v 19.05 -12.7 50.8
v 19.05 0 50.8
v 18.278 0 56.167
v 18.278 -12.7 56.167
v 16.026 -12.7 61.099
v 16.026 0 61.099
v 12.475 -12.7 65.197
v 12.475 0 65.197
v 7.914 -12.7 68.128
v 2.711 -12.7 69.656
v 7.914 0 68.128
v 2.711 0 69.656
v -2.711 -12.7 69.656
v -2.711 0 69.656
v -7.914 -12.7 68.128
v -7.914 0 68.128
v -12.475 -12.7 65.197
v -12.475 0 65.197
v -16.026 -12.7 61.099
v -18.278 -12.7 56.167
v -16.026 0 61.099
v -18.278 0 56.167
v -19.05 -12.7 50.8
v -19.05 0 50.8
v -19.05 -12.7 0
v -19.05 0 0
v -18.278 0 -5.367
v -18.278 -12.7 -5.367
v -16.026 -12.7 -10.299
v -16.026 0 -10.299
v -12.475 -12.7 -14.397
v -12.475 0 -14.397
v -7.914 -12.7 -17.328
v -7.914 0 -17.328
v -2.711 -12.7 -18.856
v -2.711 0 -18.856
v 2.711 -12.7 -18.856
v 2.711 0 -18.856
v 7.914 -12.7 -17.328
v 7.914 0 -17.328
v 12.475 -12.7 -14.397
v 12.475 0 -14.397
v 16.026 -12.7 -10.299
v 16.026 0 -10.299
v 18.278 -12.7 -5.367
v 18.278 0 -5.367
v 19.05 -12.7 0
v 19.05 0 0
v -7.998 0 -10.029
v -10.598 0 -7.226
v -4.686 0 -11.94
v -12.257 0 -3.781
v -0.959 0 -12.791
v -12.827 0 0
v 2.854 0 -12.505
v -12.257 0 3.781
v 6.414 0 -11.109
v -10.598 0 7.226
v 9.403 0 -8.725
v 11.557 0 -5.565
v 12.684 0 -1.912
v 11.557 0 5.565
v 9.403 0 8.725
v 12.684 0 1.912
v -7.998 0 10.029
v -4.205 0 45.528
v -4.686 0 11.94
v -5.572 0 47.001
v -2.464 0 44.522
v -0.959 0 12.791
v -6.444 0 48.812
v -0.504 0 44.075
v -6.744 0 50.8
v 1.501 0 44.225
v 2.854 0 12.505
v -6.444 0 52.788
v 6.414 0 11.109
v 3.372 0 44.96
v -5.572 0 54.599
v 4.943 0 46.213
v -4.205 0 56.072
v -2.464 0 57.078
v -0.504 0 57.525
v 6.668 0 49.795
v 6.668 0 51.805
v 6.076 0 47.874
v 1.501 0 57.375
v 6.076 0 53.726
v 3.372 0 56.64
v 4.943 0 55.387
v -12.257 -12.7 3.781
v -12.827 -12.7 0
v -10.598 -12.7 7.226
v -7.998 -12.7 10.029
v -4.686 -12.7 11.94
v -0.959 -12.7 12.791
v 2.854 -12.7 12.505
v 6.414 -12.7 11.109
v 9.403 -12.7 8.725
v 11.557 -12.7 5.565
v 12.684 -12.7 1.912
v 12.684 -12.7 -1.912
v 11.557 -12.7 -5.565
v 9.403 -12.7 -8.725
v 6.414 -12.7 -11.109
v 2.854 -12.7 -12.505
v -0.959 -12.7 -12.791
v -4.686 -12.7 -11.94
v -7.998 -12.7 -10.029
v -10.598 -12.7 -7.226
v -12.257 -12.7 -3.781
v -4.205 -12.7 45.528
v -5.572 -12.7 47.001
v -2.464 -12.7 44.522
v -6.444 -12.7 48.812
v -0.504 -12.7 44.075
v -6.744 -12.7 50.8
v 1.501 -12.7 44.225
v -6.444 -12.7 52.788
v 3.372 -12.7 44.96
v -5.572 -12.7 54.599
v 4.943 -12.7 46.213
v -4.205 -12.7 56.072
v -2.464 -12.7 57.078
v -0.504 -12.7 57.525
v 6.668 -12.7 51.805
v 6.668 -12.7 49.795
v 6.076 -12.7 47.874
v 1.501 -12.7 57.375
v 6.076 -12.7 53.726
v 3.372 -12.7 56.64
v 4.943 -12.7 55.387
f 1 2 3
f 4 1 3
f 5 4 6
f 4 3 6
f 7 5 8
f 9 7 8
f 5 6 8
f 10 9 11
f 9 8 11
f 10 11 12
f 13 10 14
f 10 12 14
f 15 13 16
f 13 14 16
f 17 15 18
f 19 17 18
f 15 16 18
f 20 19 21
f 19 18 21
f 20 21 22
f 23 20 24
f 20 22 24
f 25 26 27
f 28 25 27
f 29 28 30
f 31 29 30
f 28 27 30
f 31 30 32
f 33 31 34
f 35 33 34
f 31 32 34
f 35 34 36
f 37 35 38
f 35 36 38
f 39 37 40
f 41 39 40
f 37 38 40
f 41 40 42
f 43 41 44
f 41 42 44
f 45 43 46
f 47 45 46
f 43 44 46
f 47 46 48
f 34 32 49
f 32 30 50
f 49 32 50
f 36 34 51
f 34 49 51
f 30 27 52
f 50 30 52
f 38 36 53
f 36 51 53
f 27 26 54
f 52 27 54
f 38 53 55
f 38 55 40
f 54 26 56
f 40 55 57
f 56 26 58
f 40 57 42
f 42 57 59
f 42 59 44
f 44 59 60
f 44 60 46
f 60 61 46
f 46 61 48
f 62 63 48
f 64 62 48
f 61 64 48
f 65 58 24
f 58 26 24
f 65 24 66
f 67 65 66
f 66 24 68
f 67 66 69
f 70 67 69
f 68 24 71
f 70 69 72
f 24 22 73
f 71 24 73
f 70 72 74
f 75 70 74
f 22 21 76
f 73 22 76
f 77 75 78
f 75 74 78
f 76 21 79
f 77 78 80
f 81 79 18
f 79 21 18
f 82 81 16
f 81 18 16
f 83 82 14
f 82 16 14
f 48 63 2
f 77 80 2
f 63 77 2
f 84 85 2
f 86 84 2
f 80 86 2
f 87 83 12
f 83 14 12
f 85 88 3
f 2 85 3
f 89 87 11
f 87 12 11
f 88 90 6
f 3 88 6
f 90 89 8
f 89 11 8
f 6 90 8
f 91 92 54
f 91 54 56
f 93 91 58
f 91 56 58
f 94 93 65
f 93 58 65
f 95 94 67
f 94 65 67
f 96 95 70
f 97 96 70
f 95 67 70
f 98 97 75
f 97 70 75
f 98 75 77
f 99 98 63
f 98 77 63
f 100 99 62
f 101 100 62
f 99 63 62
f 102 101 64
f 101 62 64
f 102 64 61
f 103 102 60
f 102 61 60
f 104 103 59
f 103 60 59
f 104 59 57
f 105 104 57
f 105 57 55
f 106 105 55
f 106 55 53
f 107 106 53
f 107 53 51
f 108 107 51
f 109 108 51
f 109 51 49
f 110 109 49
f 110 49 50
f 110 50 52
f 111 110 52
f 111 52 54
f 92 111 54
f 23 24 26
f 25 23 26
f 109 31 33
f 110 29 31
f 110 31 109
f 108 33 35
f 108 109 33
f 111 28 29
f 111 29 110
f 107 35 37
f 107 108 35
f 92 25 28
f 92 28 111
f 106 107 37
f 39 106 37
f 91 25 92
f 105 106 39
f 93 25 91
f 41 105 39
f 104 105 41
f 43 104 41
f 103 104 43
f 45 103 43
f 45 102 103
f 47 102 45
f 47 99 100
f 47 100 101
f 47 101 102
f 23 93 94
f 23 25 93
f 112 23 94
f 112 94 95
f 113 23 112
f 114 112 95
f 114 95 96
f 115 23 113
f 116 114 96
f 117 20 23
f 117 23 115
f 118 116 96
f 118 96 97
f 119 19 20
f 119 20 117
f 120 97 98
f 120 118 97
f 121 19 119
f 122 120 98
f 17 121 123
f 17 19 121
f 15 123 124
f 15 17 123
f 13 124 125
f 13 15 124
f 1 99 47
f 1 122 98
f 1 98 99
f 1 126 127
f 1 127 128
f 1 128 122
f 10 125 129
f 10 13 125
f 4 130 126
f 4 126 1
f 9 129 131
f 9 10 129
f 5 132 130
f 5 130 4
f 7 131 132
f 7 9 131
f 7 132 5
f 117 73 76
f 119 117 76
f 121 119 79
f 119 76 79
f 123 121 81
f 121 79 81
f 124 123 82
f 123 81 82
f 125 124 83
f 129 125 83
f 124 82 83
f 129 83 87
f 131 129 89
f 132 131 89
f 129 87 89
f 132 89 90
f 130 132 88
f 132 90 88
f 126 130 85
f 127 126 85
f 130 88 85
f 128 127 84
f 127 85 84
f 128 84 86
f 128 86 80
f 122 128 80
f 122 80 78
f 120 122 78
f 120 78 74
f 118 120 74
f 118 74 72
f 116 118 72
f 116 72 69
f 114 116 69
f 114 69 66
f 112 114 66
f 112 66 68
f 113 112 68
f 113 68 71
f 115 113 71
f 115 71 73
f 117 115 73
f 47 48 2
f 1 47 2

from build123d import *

# Parameters (mm, degrees)
F1_DEPTH = 12.7
F4_D     = 13.4874
F5_D     = 25.654


with BuildPart() as f1:
    # F0 (on Front) → F1 (new body)
    with BuildSketch(Plane.XZ):
        with BuildLine():
            Line((-19.05, 50.8), (19.05, 50.8))
            ThreePointArc((19.05, 50.8), (0, 69.85), (-19.05, 50.8))
        make_face()
        with BuildLine():
            ThreePointArc((-19.05, 50.8), (0, 31.75), (19.05, 50.8))
            Line((19.05, 50.8), (-19.05, 50.8))
        make_face()
        with BuildLine():
            ThreePointArc((-19.05, 0), (0, 19.05), (19.05, 0))
            Line((19.05, 0), (19.05, 50.8))
            ThreePointArc((19.05, 50.8), (0, 31.75), (-19.05, 50.8))
            Line((-19.05, 50.8), (-19.05, 0))
        make_face()
        with BuildLine():
            Line((-19.05, 0), (19.05, 0))
            ThreePointArc((19.05, 0), (0, 19.05), (-19.05, 0))
        make_face()
        with BuildLine():
            ThreePointArc((-19.05, 0), (0, -19.05), (19.05, 0))
            Line((19.05, 0), (-19.05, 0))
        make_face()
    extrude(amount=F1_DEPTH)

    # F4 (through all)
    with Locations(Plane.XZ.offset(12.7)):
        with Locations((0, 50.8)):
            Hole(F4_D / 2)

    # F5 (through all)
    with Locations(Plane.XZ.offset(12.7)):
        with Locations((0, 0)):
            Hole(F5_D / 2)


solid = f1.part
